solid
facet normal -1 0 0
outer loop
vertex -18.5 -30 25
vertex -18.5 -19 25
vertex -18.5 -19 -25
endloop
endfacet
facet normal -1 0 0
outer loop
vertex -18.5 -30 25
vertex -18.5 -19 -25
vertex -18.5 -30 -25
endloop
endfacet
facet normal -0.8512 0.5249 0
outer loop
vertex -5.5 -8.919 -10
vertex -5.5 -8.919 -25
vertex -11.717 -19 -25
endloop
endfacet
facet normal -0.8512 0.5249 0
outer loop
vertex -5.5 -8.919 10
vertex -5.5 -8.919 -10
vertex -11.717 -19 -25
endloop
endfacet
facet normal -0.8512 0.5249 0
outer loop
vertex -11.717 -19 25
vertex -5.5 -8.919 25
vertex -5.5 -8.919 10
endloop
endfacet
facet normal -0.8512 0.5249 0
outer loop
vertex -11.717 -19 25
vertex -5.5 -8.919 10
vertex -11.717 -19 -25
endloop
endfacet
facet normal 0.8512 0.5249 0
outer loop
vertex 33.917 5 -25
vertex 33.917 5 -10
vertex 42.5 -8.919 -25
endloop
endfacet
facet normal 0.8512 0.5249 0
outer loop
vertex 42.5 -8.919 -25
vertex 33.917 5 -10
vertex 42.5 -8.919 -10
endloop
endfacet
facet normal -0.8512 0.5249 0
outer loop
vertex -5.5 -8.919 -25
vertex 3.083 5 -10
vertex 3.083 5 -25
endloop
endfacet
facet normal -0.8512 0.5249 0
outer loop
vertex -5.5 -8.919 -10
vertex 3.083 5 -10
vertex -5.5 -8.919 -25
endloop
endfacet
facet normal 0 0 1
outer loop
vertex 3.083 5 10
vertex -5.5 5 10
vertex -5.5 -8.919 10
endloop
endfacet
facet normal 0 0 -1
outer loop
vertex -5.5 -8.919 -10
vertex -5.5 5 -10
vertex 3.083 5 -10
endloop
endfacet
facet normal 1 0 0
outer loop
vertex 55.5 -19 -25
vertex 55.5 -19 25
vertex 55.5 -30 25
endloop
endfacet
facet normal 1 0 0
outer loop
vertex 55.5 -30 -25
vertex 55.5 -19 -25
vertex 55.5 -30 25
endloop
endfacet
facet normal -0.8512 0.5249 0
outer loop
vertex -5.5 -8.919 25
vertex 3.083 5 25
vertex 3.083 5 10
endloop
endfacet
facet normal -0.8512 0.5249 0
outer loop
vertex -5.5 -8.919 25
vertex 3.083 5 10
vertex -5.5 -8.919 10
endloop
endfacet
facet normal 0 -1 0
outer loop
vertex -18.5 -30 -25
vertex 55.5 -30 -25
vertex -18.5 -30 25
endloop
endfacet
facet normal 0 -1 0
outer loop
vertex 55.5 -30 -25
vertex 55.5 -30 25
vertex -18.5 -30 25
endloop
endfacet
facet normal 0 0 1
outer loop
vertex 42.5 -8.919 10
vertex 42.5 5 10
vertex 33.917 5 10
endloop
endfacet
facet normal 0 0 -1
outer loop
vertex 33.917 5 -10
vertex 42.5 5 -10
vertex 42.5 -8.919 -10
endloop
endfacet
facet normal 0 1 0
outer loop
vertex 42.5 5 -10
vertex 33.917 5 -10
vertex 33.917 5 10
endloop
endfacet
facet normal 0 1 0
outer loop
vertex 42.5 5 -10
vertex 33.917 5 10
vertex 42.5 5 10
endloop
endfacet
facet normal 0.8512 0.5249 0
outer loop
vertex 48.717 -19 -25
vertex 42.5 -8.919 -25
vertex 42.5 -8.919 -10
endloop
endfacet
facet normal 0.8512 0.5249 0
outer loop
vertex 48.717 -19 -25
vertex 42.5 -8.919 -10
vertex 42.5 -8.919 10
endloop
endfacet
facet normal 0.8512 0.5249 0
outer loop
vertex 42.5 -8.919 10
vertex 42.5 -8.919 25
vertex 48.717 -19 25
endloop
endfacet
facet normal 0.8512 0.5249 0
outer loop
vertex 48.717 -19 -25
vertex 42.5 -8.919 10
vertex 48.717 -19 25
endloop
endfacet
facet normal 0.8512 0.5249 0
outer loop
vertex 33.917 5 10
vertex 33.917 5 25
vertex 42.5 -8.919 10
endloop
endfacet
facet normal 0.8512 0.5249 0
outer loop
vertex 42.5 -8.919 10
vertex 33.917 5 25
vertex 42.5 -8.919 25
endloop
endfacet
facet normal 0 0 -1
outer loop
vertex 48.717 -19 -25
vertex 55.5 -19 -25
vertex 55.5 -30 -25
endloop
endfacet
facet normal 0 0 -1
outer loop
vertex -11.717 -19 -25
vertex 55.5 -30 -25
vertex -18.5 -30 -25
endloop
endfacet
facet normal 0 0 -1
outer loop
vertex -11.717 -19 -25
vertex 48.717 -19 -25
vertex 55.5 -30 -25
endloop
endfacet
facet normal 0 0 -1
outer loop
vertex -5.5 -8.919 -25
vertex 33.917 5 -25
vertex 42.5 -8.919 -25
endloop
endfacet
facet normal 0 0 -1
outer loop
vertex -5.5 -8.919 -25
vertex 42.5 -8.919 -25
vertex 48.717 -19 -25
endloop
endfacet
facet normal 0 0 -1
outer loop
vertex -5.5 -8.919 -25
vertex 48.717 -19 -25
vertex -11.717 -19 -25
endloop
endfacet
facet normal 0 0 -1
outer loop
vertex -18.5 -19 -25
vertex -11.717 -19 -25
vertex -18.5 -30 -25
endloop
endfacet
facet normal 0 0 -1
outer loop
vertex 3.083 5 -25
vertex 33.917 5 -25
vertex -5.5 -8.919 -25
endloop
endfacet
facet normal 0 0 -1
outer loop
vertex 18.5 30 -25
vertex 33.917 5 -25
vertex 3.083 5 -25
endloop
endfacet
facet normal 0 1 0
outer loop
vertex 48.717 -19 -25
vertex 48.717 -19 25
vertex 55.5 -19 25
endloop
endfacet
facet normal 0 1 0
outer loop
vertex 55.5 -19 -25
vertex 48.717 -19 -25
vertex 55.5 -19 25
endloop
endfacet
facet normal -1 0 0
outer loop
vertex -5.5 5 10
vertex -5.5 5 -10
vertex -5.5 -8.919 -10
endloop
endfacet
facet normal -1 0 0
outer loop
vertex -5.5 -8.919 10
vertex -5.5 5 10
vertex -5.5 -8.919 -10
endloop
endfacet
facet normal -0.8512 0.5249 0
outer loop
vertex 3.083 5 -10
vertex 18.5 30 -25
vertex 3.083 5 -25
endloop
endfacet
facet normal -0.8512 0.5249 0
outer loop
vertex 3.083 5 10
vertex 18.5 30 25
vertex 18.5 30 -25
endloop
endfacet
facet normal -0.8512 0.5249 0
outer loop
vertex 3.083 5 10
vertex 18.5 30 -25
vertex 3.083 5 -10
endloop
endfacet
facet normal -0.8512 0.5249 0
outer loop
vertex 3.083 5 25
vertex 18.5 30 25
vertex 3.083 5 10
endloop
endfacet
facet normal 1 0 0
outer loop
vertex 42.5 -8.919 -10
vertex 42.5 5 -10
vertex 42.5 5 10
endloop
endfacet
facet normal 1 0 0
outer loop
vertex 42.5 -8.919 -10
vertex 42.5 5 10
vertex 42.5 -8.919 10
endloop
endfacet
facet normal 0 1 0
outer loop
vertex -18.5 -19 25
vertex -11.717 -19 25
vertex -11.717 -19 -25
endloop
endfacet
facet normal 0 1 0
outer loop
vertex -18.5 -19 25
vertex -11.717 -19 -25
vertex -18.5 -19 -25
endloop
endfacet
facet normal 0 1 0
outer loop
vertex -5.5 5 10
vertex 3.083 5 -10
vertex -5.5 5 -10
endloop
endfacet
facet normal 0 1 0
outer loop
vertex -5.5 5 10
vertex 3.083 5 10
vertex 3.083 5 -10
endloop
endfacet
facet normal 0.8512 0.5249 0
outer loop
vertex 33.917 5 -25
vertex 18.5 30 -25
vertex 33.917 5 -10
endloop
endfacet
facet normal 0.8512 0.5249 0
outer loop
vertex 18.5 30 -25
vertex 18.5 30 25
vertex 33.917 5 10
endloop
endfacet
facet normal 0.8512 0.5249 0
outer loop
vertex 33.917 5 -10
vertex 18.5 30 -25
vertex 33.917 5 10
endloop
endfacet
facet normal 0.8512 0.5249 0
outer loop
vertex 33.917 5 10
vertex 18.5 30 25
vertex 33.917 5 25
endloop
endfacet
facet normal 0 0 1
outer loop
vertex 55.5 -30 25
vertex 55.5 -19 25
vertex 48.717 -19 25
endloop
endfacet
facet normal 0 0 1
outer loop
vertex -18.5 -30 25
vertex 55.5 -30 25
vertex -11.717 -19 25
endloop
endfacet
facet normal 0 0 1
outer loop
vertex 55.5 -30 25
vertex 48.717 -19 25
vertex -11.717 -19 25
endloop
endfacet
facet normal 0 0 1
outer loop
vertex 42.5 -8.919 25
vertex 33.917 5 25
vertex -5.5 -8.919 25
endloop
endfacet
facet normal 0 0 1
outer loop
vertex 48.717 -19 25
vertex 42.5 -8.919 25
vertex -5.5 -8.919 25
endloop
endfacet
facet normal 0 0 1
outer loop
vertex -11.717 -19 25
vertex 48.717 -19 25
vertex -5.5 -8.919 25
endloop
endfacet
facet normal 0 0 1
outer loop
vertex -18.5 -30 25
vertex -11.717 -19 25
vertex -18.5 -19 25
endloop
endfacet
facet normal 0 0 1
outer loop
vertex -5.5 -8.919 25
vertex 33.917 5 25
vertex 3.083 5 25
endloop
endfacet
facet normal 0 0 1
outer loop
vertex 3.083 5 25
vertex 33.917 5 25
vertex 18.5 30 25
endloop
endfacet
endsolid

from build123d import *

# Parameters (mm, degrees)
EXTRUDE_1_DEPTH = 25
EXTRUDE_2_DEPTH = 10


with BuildPart() as part:
    # Эскиз1 → Бобышка-Вытянуть1 (new, symmetric)
    with BuildSketch(Plane.XY):
        Polygon((-11.716666667, -19), (-18.5, -19), (-18.5, -30), (18.5, -30), (18.5, 30), align=None)
    extrude_1 = extrude(amount=EXTRUDE_1_DEPTH, both=True)

    # Эскиз1<3> → Бобышка-Вытянуть2 (add, symmetric)
    with BuildSketch(Plane.XY):
        Polygon((-5.5, 5), (-5.5, -8.918918919), (3.083333333, 5), align=None)
    extrude_2 = extrude(amount=EXTRUDE_2_DEPTH, both=True)

    # Зеркальное отражение1: Бобышка-Вытянуть1, Бобышка-Вытянуть2 across plane
    add(extrude_1.mirror(Plane(origin=(18.5, 0, -25), x_dir=(0, 0, 1), z_dir=(1, 0, 0))))
    add(extrude_2.mirror(Plane(origin=(18.5, 0, -25), x_dir=(0, 0, 1), z_dir=(1, 0, 0))))


solid = part.part
